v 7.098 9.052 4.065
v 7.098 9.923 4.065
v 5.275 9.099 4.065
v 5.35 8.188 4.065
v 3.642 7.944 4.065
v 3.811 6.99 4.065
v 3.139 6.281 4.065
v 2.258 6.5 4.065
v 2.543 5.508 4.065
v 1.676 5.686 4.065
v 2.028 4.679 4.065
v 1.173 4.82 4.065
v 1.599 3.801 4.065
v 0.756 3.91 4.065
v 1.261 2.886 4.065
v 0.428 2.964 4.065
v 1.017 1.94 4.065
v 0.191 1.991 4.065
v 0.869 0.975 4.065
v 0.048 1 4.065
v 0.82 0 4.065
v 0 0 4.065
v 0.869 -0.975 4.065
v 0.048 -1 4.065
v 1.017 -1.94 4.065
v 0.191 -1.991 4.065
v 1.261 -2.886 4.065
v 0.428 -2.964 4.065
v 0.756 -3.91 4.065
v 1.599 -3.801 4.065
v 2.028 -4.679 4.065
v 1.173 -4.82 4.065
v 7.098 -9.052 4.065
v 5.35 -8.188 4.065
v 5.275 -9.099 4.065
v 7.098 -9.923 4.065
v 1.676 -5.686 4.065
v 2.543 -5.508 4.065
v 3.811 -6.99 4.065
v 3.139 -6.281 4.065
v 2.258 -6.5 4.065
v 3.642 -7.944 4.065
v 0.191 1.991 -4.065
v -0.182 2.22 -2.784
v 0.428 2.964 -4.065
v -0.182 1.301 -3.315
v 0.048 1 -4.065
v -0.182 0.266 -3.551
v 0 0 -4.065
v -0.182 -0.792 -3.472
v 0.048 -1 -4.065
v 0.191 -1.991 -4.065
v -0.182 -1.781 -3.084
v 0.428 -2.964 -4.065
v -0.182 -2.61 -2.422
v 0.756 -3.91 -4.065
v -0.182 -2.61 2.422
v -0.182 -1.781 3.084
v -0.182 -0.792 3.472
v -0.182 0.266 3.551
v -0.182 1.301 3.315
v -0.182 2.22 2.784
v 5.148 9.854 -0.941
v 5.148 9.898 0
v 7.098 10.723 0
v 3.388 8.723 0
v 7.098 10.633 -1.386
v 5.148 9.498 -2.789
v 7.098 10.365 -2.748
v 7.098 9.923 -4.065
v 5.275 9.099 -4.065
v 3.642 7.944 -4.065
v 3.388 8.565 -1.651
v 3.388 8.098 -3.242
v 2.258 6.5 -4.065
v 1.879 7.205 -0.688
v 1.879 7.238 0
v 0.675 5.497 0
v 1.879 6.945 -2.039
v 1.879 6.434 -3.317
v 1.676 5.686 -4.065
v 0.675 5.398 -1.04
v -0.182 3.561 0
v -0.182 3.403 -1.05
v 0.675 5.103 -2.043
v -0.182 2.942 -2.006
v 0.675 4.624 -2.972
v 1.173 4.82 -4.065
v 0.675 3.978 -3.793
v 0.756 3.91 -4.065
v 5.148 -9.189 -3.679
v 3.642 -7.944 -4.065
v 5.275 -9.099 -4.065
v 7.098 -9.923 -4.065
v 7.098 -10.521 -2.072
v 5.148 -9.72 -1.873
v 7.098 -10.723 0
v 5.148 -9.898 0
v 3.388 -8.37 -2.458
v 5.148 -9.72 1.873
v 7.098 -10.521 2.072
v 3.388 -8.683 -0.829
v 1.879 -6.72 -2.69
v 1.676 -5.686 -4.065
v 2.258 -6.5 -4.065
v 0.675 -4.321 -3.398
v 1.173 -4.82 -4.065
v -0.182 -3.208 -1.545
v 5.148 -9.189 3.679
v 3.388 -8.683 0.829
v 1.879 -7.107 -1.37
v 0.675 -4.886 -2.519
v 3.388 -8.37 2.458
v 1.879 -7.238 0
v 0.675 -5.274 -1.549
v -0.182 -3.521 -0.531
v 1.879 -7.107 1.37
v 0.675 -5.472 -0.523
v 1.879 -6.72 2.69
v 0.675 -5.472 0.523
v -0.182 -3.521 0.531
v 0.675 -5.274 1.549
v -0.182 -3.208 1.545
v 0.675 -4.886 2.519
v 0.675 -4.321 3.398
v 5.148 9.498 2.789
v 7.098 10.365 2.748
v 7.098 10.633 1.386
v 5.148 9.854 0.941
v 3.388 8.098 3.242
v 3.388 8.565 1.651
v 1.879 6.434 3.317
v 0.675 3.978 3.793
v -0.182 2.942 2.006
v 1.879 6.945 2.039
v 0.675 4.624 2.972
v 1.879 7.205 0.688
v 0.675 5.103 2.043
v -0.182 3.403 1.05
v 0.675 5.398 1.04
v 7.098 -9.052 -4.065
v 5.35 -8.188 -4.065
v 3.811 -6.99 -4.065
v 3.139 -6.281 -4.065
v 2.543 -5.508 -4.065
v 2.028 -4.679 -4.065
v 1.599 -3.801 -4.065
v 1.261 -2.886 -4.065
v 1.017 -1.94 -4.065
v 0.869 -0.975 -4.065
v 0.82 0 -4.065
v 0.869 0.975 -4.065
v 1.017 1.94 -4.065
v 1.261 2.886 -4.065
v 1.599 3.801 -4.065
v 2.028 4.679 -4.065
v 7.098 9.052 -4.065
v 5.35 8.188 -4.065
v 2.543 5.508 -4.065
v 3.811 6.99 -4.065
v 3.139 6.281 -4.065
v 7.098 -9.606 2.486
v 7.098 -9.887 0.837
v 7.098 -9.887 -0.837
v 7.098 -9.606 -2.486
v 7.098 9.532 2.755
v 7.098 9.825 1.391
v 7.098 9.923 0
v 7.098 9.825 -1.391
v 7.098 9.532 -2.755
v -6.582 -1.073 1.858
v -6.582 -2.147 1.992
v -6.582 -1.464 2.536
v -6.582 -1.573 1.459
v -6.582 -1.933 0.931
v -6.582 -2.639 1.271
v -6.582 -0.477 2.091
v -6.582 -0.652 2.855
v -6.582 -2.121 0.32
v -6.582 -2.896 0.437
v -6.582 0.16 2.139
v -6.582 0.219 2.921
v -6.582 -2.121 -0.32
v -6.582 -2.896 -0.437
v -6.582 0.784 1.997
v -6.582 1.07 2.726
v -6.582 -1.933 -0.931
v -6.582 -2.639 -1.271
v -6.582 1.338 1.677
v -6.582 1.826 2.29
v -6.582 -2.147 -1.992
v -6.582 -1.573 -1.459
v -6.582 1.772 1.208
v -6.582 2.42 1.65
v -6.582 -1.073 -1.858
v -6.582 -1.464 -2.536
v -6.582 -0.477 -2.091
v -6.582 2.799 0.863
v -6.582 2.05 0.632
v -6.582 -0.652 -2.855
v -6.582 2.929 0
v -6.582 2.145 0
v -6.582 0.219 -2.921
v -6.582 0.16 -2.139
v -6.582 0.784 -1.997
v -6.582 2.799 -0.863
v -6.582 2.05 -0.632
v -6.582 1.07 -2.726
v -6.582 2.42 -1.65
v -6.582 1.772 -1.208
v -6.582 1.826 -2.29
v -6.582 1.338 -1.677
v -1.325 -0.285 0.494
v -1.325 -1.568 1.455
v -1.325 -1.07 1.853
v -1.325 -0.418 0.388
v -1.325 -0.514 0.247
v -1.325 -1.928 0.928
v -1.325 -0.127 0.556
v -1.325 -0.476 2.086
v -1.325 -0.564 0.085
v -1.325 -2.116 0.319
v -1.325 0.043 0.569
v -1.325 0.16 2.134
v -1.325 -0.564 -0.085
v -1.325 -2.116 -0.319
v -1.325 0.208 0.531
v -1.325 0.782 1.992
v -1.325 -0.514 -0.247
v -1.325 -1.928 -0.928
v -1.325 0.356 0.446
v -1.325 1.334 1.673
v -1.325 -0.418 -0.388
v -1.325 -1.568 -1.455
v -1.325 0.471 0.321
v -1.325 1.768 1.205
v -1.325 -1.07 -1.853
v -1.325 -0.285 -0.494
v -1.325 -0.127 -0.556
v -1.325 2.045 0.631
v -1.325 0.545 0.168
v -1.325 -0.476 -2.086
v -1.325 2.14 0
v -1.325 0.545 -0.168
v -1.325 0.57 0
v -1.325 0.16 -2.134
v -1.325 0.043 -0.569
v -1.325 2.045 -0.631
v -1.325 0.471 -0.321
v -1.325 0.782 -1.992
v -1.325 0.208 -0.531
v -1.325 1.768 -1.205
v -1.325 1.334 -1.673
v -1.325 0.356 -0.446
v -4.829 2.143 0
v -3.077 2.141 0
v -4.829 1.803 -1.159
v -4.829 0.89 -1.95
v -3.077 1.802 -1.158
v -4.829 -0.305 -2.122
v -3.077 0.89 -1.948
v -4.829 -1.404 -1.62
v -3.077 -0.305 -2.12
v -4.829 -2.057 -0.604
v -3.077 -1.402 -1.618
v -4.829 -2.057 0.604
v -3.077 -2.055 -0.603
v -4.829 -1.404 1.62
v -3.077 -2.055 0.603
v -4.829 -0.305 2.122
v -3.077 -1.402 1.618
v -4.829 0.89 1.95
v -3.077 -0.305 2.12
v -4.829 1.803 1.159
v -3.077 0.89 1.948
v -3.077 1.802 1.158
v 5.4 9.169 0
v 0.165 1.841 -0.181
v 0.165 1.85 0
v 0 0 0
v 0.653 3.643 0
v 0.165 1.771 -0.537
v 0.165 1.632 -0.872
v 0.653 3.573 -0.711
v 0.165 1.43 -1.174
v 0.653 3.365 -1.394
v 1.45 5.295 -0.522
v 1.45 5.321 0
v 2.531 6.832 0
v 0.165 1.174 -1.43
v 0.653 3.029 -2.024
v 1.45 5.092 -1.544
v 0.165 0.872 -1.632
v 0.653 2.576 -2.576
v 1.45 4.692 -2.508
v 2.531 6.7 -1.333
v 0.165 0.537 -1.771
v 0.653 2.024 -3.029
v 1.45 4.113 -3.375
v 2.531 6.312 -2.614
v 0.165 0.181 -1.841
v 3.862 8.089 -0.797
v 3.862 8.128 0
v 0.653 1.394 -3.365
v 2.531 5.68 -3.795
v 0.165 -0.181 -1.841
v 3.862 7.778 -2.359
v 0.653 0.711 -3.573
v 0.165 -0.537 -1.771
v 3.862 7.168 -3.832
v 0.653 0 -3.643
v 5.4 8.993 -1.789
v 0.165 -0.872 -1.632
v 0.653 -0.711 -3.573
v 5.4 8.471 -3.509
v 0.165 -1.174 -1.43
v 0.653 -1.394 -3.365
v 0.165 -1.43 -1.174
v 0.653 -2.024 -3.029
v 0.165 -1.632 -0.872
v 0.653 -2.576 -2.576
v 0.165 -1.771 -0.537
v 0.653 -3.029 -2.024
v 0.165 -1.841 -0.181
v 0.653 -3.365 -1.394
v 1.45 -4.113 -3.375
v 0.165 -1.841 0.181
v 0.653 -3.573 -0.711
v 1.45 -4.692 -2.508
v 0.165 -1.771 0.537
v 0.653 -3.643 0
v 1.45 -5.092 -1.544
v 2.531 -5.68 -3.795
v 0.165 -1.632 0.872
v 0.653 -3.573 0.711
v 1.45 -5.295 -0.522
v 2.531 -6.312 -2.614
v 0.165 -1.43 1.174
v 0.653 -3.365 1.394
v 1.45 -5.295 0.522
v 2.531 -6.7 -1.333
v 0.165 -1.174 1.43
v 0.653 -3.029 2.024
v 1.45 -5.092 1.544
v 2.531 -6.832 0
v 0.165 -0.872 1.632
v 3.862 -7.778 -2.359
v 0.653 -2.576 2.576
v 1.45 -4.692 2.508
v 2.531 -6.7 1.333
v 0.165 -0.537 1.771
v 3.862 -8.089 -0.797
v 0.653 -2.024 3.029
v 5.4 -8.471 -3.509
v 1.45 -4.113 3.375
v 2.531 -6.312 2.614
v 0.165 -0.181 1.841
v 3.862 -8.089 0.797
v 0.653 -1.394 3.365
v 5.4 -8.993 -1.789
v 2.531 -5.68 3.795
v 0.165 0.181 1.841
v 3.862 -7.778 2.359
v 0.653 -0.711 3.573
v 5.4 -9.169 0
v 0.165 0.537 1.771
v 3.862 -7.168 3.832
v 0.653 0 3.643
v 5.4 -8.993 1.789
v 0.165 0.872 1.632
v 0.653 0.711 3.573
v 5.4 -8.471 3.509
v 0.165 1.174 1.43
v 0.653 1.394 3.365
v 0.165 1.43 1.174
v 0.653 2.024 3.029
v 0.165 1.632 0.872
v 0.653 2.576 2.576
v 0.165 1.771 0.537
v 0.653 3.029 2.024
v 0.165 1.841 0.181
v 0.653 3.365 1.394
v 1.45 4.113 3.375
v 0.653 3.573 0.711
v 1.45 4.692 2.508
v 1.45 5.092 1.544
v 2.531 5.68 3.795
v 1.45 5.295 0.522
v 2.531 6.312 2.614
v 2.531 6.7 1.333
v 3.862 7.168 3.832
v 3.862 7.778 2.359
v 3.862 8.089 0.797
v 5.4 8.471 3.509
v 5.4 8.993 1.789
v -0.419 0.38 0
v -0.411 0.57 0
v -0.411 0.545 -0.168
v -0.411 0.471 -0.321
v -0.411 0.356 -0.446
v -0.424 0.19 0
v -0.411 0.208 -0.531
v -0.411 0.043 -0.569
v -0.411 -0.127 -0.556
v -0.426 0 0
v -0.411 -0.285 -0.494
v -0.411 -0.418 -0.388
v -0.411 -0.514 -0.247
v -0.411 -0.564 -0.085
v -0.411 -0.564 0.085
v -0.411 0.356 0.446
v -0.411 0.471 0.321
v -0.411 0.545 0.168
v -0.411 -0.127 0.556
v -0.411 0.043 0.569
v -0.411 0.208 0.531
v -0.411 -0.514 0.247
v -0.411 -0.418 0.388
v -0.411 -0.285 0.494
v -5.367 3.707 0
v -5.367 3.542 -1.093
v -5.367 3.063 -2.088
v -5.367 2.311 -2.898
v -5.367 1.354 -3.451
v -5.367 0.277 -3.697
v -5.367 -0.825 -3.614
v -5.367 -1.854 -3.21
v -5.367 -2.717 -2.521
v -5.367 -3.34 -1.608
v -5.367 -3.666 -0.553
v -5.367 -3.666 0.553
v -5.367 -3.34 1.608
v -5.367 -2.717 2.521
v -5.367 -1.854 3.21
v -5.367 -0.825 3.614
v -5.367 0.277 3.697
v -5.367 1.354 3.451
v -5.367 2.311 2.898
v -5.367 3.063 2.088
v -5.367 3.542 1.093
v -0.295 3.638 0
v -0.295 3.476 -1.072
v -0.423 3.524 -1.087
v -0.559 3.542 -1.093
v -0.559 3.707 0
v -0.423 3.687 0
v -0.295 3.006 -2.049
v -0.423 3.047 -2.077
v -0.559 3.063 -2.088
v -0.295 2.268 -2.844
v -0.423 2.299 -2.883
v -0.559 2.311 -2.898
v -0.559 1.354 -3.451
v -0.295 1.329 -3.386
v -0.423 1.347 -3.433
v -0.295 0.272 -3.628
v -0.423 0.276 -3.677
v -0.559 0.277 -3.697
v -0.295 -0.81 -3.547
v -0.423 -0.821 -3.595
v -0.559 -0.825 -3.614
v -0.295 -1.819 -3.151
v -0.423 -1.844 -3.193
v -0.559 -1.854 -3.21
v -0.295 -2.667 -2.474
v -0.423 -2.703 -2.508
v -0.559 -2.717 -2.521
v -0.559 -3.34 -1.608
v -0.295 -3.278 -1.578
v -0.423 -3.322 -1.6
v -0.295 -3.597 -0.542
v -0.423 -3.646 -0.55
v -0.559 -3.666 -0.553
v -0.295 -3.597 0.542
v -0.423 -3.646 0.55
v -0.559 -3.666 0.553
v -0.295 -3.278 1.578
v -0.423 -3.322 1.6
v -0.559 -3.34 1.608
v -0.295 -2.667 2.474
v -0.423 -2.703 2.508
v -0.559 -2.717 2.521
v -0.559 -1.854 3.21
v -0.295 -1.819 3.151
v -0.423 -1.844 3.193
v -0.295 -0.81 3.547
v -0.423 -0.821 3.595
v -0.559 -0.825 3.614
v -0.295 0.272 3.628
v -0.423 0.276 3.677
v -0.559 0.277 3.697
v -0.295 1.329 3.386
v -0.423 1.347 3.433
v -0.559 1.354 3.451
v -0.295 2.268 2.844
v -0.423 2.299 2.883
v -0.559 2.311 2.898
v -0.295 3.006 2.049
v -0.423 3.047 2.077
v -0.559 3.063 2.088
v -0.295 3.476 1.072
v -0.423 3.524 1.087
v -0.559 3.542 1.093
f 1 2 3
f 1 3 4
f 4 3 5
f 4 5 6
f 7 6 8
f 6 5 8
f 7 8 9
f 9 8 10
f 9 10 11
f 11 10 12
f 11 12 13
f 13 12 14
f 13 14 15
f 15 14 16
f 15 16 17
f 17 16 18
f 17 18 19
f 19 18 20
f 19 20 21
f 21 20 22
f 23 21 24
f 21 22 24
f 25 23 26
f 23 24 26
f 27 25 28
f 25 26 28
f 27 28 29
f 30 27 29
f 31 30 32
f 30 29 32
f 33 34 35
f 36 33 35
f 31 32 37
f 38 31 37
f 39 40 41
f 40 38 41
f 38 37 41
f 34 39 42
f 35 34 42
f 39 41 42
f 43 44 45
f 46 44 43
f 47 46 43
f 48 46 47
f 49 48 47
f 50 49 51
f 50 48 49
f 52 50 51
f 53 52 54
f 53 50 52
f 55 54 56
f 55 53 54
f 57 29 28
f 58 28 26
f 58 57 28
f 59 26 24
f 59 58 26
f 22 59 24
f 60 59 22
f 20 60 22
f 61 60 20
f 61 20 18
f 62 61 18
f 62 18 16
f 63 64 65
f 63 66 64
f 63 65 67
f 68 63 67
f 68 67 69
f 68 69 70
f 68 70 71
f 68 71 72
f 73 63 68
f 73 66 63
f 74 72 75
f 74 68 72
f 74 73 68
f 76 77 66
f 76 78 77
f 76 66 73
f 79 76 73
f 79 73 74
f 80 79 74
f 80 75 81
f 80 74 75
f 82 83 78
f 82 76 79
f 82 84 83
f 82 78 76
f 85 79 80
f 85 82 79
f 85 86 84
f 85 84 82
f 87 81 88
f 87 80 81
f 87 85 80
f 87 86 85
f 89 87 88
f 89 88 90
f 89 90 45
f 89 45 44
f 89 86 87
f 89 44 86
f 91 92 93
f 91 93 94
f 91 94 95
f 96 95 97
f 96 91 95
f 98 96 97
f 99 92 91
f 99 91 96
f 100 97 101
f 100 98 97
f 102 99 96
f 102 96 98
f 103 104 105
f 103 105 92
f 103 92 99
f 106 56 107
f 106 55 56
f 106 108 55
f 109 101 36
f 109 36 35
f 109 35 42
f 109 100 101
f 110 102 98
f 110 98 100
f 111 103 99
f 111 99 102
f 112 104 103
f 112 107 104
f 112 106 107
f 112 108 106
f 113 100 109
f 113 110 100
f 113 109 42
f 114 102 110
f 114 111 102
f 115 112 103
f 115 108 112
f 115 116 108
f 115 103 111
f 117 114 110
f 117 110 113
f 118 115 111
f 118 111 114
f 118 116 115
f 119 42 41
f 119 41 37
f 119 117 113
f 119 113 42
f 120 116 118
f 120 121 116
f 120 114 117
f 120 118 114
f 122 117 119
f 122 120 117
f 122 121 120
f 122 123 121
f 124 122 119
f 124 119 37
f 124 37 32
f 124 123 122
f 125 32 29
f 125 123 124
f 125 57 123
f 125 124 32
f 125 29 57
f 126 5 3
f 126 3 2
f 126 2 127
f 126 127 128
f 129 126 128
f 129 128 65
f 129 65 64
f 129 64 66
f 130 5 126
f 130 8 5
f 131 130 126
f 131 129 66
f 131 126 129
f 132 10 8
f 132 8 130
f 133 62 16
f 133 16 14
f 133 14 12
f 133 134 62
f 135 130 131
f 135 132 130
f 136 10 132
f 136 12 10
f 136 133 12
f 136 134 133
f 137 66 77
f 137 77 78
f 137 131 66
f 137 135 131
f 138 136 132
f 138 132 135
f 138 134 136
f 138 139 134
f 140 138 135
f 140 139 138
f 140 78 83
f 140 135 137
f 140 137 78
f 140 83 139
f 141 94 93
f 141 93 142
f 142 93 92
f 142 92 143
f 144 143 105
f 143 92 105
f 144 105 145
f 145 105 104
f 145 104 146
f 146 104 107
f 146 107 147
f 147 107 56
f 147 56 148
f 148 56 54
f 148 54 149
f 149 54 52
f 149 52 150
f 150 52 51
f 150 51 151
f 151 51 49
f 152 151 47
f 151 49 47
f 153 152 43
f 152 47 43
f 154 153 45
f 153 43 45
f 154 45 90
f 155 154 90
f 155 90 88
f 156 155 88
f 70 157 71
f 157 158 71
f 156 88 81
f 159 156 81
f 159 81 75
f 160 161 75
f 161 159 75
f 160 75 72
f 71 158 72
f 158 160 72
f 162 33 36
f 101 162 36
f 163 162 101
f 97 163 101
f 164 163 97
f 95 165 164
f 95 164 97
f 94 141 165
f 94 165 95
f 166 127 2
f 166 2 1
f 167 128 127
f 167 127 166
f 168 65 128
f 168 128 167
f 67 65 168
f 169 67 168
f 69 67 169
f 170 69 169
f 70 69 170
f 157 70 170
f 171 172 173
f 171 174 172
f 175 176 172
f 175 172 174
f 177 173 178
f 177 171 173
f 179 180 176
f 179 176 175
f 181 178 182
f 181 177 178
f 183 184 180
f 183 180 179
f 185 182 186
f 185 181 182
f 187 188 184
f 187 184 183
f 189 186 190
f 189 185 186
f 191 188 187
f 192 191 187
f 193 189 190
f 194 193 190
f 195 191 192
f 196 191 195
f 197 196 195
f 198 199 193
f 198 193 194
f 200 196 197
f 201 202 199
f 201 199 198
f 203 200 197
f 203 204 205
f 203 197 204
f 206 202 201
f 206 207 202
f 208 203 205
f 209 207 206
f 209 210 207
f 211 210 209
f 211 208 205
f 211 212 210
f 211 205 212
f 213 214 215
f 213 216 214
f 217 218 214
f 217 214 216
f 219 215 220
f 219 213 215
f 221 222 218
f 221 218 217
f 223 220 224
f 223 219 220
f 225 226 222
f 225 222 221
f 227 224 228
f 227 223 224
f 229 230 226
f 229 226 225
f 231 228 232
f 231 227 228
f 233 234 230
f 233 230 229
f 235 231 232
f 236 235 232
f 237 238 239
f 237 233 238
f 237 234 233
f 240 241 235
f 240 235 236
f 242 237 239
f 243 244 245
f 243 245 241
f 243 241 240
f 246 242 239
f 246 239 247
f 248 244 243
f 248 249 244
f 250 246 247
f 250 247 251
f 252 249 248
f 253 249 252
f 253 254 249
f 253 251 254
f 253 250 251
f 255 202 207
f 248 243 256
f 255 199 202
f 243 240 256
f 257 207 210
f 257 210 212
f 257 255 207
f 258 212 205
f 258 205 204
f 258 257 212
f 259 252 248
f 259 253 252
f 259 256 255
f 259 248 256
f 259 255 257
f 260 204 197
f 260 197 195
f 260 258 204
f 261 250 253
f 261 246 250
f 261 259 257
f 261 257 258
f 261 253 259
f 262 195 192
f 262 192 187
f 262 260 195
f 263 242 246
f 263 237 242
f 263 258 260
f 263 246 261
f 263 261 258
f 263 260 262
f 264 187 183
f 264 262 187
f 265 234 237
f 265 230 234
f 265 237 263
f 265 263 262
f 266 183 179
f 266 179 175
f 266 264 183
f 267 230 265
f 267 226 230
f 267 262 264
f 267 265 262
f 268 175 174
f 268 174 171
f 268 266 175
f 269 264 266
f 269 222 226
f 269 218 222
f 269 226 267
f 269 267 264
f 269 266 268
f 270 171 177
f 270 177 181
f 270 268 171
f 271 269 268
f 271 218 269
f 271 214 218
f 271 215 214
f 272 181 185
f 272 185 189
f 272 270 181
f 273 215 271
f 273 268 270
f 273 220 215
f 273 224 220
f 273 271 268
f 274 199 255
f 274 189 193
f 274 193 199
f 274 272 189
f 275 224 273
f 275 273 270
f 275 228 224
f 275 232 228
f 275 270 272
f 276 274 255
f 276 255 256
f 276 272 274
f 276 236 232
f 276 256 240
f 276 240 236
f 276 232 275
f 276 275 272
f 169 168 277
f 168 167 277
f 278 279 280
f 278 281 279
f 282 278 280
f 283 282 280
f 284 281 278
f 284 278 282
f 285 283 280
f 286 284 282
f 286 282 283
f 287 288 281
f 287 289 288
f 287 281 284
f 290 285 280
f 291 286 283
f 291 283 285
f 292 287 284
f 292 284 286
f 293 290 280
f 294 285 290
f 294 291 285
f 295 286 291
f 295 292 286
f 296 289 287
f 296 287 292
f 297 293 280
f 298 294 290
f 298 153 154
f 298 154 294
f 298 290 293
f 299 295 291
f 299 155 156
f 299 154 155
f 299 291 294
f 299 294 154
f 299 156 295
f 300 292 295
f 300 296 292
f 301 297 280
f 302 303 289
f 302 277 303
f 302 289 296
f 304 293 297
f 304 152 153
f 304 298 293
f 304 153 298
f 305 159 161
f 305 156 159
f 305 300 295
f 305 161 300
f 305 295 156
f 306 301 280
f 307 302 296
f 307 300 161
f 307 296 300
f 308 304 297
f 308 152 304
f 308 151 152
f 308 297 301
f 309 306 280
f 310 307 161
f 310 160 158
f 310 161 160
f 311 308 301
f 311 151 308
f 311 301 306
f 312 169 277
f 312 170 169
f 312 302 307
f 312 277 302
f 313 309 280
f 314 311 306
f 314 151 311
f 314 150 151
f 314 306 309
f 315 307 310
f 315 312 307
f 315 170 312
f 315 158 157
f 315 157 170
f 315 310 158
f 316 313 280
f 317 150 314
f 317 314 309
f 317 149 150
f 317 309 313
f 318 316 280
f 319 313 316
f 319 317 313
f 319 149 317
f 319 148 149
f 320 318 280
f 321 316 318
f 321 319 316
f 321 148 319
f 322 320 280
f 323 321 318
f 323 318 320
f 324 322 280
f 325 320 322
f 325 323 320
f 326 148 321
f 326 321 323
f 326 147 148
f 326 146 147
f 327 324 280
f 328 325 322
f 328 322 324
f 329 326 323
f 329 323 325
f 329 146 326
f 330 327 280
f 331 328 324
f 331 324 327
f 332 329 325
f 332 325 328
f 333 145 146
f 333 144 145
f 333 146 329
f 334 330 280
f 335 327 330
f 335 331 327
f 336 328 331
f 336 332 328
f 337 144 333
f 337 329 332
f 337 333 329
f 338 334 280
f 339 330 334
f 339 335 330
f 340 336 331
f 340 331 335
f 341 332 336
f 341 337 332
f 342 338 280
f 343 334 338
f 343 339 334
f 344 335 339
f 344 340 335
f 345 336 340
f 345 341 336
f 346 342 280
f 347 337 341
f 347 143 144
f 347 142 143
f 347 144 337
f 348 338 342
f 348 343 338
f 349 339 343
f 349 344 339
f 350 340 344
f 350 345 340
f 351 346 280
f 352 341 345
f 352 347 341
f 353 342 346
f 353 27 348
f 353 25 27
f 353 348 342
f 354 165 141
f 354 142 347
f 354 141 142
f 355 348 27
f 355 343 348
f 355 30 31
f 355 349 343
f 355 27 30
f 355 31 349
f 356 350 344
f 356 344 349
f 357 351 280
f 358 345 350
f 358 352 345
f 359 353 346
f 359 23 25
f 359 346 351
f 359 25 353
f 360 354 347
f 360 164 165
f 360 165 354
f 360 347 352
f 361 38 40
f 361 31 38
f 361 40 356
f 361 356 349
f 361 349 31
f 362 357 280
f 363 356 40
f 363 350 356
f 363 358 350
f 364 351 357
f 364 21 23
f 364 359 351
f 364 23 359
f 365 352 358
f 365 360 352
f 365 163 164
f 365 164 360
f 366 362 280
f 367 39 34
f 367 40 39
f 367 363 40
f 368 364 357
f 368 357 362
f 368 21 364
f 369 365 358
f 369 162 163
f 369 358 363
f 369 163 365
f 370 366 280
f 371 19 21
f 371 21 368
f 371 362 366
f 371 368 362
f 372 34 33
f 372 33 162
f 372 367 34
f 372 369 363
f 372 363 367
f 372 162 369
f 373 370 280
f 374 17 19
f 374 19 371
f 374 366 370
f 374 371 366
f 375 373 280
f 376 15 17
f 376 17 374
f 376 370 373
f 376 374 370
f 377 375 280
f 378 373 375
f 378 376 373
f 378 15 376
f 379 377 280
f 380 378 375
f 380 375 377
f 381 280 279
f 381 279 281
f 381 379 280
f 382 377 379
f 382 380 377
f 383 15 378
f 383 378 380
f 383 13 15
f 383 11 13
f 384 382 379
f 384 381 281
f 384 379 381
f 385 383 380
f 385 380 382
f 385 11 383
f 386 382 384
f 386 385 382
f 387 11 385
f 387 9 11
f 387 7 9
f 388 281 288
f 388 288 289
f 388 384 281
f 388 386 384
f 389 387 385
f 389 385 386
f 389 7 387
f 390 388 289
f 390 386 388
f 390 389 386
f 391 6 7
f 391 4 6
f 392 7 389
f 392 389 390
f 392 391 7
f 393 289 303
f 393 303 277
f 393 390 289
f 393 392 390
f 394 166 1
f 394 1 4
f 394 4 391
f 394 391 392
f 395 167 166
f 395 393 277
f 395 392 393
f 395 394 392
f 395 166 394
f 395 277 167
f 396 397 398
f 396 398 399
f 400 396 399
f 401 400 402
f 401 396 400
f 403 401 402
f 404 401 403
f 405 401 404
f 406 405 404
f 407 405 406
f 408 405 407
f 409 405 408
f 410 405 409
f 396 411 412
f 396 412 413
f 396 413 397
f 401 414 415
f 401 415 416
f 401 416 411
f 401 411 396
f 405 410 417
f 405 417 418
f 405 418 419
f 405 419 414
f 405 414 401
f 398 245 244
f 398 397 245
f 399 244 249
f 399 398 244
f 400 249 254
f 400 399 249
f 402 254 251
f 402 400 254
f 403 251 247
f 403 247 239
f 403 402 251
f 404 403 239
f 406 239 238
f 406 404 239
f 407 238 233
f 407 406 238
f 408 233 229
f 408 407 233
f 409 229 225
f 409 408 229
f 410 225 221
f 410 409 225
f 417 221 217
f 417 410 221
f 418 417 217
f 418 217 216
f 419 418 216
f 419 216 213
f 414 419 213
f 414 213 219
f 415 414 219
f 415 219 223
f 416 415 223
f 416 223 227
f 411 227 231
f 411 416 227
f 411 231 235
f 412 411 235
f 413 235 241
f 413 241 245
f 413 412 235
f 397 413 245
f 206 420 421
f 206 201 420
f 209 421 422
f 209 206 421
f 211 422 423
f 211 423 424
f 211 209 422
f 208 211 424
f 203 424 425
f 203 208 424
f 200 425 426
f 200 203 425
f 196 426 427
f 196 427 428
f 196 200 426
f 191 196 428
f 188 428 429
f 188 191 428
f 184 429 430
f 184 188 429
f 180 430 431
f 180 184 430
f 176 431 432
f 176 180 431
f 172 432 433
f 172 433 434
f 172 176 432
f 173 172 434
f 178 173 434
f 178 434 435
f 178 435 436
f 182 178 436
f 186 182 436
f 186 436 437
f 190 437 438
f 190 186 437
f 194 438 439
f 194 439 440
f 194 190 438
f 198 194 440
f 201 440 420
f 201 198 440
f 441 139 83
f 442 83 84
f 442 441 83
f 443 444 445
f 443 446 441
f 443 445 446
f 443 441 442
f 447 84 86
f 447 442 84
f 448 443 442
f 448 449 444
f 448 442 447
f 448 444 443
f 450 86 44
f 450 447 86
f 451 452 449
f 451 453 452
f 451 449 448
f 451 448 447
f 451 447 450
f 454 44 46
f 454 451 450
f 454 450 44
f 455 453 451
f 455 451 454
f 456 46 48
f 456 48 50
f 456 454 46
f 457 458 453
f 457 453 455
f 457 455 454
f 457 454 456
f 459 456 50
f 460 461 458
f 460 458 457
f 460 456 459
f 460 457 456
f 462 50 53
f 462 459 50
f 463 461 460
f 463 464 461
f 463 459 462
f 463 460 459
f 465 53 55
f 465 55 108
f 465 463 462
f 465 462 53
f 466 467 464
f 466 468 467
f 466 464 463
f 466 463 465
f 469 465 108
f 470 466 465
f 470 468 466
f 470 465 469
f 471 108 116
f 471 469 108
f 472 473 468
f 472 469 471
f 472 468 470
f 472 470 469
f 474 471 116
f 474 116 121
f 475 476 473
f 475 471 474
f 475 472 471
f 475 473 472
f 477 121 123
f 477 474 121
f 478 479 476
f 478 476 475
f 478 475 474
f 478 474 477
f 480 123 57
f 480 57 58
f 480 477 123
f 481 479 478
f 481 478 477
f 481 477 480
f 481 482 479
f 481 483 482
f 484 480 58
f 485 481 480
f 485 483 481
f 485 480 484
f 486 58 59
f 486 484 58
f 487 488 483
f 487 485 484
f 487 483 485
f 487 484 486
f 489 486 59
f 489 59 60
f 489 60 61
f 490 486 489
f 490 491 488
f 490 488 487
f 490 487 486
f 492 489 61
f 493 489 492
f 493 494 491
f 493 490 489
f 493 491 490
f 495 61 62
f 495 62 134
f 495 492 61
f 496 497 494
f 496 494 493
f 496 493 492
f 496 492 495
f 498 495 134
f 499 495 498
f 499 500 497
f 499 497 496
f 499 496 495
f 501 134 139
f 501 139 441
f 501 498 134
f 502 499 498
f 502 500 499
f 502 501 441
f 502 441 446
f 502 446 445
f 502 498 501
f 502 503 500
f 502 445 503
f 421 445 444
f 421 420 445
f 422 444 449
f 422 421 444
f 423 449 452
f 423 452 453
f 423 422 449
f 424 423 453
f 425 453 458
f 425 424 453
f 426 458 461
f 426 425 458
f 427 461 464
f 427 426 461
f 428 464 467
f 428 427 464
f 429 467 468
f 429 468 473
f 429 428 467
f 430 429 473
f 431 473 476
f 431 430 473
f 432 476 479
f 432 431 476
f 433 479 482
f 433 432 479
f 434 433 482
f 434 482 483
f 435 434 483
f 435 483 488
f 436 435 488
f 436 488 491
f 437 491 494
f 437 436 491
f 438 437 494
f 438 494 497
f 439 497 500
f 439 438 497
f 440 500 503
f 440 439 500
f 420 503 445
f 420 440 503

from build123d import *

# Parameters (mm, degrees)
KES_EKSTR_ZYON1_DEPTH = 18


with BuildPart() as part:
    # Çizim1 → Döndür3 (revolve)
    with BuildSketch(Plane.XY):
        with BuildLine():
            Line((-1.32512155, 2.139611708), (-1.32512155, 0.570301782))
            Line((-1.32512155, 0.570301782), (-0.411194993, 0.570301782))
            ThreePointArc((-0.411194993, 0.570301782), (-0.422380451, 0.285248389), (-0.426109787, 0))
            Line((-0.426109787, 0), (0, 0))
            ThreePointArc((0, 0), (1.957189595, 6.100058308), (7.098060997, 9.922720168))
            Line((7.098060997, 9.922720168), (7.098060997, 10.723199249))
            ThreePointArc((7.098060997, 10.723199249), (2.598216191, 8.016184499), (-0.181803757, 3.56107269))
            ThreePointArc((-0.181803757, 3.56107269), (-0.35786127, 3.666258696), (-0.558844205, 3.707077853))
            Line((-0.558844205, 3.707077853), (-5.367482514, 3.707077853))
            Line((-5.367482514, 3.707077853), (-6.581672956, 2.928819663))
            Line((-6.581672956, 2.928819663), (-6.581672956, 2.145222918))
            Line((-6.581672956, 2.145222918), (-1.32512155, 2.139611708))
        make_face()
    revolve(axis=Axis((0, 0, 0), (-1, 0, 0)))

    # Çizim2 → Kes-Ekstrüzyon1 (cut)
    with BuildSketch(Plane.ZY.offset(6.581672956)):
        Polygon((-4.065, 0), (-4.065, 9.922841183), (-12.277622452, 10.110434639), (-12.277622452, -10.854234794), (-4.065, -10.854234794), align=None)
        Polygon((4.065, 0), (4.065, 10.512736346), (12.14810156, 10.512736346), (12.606032623, -11.349214468), (4.065, -11.349214468), align=None)
    extrude(amount=-KES_EKSTR_ZYON1_DEPTH, mode=Mode.SUBTRACT)


solid = part.part
